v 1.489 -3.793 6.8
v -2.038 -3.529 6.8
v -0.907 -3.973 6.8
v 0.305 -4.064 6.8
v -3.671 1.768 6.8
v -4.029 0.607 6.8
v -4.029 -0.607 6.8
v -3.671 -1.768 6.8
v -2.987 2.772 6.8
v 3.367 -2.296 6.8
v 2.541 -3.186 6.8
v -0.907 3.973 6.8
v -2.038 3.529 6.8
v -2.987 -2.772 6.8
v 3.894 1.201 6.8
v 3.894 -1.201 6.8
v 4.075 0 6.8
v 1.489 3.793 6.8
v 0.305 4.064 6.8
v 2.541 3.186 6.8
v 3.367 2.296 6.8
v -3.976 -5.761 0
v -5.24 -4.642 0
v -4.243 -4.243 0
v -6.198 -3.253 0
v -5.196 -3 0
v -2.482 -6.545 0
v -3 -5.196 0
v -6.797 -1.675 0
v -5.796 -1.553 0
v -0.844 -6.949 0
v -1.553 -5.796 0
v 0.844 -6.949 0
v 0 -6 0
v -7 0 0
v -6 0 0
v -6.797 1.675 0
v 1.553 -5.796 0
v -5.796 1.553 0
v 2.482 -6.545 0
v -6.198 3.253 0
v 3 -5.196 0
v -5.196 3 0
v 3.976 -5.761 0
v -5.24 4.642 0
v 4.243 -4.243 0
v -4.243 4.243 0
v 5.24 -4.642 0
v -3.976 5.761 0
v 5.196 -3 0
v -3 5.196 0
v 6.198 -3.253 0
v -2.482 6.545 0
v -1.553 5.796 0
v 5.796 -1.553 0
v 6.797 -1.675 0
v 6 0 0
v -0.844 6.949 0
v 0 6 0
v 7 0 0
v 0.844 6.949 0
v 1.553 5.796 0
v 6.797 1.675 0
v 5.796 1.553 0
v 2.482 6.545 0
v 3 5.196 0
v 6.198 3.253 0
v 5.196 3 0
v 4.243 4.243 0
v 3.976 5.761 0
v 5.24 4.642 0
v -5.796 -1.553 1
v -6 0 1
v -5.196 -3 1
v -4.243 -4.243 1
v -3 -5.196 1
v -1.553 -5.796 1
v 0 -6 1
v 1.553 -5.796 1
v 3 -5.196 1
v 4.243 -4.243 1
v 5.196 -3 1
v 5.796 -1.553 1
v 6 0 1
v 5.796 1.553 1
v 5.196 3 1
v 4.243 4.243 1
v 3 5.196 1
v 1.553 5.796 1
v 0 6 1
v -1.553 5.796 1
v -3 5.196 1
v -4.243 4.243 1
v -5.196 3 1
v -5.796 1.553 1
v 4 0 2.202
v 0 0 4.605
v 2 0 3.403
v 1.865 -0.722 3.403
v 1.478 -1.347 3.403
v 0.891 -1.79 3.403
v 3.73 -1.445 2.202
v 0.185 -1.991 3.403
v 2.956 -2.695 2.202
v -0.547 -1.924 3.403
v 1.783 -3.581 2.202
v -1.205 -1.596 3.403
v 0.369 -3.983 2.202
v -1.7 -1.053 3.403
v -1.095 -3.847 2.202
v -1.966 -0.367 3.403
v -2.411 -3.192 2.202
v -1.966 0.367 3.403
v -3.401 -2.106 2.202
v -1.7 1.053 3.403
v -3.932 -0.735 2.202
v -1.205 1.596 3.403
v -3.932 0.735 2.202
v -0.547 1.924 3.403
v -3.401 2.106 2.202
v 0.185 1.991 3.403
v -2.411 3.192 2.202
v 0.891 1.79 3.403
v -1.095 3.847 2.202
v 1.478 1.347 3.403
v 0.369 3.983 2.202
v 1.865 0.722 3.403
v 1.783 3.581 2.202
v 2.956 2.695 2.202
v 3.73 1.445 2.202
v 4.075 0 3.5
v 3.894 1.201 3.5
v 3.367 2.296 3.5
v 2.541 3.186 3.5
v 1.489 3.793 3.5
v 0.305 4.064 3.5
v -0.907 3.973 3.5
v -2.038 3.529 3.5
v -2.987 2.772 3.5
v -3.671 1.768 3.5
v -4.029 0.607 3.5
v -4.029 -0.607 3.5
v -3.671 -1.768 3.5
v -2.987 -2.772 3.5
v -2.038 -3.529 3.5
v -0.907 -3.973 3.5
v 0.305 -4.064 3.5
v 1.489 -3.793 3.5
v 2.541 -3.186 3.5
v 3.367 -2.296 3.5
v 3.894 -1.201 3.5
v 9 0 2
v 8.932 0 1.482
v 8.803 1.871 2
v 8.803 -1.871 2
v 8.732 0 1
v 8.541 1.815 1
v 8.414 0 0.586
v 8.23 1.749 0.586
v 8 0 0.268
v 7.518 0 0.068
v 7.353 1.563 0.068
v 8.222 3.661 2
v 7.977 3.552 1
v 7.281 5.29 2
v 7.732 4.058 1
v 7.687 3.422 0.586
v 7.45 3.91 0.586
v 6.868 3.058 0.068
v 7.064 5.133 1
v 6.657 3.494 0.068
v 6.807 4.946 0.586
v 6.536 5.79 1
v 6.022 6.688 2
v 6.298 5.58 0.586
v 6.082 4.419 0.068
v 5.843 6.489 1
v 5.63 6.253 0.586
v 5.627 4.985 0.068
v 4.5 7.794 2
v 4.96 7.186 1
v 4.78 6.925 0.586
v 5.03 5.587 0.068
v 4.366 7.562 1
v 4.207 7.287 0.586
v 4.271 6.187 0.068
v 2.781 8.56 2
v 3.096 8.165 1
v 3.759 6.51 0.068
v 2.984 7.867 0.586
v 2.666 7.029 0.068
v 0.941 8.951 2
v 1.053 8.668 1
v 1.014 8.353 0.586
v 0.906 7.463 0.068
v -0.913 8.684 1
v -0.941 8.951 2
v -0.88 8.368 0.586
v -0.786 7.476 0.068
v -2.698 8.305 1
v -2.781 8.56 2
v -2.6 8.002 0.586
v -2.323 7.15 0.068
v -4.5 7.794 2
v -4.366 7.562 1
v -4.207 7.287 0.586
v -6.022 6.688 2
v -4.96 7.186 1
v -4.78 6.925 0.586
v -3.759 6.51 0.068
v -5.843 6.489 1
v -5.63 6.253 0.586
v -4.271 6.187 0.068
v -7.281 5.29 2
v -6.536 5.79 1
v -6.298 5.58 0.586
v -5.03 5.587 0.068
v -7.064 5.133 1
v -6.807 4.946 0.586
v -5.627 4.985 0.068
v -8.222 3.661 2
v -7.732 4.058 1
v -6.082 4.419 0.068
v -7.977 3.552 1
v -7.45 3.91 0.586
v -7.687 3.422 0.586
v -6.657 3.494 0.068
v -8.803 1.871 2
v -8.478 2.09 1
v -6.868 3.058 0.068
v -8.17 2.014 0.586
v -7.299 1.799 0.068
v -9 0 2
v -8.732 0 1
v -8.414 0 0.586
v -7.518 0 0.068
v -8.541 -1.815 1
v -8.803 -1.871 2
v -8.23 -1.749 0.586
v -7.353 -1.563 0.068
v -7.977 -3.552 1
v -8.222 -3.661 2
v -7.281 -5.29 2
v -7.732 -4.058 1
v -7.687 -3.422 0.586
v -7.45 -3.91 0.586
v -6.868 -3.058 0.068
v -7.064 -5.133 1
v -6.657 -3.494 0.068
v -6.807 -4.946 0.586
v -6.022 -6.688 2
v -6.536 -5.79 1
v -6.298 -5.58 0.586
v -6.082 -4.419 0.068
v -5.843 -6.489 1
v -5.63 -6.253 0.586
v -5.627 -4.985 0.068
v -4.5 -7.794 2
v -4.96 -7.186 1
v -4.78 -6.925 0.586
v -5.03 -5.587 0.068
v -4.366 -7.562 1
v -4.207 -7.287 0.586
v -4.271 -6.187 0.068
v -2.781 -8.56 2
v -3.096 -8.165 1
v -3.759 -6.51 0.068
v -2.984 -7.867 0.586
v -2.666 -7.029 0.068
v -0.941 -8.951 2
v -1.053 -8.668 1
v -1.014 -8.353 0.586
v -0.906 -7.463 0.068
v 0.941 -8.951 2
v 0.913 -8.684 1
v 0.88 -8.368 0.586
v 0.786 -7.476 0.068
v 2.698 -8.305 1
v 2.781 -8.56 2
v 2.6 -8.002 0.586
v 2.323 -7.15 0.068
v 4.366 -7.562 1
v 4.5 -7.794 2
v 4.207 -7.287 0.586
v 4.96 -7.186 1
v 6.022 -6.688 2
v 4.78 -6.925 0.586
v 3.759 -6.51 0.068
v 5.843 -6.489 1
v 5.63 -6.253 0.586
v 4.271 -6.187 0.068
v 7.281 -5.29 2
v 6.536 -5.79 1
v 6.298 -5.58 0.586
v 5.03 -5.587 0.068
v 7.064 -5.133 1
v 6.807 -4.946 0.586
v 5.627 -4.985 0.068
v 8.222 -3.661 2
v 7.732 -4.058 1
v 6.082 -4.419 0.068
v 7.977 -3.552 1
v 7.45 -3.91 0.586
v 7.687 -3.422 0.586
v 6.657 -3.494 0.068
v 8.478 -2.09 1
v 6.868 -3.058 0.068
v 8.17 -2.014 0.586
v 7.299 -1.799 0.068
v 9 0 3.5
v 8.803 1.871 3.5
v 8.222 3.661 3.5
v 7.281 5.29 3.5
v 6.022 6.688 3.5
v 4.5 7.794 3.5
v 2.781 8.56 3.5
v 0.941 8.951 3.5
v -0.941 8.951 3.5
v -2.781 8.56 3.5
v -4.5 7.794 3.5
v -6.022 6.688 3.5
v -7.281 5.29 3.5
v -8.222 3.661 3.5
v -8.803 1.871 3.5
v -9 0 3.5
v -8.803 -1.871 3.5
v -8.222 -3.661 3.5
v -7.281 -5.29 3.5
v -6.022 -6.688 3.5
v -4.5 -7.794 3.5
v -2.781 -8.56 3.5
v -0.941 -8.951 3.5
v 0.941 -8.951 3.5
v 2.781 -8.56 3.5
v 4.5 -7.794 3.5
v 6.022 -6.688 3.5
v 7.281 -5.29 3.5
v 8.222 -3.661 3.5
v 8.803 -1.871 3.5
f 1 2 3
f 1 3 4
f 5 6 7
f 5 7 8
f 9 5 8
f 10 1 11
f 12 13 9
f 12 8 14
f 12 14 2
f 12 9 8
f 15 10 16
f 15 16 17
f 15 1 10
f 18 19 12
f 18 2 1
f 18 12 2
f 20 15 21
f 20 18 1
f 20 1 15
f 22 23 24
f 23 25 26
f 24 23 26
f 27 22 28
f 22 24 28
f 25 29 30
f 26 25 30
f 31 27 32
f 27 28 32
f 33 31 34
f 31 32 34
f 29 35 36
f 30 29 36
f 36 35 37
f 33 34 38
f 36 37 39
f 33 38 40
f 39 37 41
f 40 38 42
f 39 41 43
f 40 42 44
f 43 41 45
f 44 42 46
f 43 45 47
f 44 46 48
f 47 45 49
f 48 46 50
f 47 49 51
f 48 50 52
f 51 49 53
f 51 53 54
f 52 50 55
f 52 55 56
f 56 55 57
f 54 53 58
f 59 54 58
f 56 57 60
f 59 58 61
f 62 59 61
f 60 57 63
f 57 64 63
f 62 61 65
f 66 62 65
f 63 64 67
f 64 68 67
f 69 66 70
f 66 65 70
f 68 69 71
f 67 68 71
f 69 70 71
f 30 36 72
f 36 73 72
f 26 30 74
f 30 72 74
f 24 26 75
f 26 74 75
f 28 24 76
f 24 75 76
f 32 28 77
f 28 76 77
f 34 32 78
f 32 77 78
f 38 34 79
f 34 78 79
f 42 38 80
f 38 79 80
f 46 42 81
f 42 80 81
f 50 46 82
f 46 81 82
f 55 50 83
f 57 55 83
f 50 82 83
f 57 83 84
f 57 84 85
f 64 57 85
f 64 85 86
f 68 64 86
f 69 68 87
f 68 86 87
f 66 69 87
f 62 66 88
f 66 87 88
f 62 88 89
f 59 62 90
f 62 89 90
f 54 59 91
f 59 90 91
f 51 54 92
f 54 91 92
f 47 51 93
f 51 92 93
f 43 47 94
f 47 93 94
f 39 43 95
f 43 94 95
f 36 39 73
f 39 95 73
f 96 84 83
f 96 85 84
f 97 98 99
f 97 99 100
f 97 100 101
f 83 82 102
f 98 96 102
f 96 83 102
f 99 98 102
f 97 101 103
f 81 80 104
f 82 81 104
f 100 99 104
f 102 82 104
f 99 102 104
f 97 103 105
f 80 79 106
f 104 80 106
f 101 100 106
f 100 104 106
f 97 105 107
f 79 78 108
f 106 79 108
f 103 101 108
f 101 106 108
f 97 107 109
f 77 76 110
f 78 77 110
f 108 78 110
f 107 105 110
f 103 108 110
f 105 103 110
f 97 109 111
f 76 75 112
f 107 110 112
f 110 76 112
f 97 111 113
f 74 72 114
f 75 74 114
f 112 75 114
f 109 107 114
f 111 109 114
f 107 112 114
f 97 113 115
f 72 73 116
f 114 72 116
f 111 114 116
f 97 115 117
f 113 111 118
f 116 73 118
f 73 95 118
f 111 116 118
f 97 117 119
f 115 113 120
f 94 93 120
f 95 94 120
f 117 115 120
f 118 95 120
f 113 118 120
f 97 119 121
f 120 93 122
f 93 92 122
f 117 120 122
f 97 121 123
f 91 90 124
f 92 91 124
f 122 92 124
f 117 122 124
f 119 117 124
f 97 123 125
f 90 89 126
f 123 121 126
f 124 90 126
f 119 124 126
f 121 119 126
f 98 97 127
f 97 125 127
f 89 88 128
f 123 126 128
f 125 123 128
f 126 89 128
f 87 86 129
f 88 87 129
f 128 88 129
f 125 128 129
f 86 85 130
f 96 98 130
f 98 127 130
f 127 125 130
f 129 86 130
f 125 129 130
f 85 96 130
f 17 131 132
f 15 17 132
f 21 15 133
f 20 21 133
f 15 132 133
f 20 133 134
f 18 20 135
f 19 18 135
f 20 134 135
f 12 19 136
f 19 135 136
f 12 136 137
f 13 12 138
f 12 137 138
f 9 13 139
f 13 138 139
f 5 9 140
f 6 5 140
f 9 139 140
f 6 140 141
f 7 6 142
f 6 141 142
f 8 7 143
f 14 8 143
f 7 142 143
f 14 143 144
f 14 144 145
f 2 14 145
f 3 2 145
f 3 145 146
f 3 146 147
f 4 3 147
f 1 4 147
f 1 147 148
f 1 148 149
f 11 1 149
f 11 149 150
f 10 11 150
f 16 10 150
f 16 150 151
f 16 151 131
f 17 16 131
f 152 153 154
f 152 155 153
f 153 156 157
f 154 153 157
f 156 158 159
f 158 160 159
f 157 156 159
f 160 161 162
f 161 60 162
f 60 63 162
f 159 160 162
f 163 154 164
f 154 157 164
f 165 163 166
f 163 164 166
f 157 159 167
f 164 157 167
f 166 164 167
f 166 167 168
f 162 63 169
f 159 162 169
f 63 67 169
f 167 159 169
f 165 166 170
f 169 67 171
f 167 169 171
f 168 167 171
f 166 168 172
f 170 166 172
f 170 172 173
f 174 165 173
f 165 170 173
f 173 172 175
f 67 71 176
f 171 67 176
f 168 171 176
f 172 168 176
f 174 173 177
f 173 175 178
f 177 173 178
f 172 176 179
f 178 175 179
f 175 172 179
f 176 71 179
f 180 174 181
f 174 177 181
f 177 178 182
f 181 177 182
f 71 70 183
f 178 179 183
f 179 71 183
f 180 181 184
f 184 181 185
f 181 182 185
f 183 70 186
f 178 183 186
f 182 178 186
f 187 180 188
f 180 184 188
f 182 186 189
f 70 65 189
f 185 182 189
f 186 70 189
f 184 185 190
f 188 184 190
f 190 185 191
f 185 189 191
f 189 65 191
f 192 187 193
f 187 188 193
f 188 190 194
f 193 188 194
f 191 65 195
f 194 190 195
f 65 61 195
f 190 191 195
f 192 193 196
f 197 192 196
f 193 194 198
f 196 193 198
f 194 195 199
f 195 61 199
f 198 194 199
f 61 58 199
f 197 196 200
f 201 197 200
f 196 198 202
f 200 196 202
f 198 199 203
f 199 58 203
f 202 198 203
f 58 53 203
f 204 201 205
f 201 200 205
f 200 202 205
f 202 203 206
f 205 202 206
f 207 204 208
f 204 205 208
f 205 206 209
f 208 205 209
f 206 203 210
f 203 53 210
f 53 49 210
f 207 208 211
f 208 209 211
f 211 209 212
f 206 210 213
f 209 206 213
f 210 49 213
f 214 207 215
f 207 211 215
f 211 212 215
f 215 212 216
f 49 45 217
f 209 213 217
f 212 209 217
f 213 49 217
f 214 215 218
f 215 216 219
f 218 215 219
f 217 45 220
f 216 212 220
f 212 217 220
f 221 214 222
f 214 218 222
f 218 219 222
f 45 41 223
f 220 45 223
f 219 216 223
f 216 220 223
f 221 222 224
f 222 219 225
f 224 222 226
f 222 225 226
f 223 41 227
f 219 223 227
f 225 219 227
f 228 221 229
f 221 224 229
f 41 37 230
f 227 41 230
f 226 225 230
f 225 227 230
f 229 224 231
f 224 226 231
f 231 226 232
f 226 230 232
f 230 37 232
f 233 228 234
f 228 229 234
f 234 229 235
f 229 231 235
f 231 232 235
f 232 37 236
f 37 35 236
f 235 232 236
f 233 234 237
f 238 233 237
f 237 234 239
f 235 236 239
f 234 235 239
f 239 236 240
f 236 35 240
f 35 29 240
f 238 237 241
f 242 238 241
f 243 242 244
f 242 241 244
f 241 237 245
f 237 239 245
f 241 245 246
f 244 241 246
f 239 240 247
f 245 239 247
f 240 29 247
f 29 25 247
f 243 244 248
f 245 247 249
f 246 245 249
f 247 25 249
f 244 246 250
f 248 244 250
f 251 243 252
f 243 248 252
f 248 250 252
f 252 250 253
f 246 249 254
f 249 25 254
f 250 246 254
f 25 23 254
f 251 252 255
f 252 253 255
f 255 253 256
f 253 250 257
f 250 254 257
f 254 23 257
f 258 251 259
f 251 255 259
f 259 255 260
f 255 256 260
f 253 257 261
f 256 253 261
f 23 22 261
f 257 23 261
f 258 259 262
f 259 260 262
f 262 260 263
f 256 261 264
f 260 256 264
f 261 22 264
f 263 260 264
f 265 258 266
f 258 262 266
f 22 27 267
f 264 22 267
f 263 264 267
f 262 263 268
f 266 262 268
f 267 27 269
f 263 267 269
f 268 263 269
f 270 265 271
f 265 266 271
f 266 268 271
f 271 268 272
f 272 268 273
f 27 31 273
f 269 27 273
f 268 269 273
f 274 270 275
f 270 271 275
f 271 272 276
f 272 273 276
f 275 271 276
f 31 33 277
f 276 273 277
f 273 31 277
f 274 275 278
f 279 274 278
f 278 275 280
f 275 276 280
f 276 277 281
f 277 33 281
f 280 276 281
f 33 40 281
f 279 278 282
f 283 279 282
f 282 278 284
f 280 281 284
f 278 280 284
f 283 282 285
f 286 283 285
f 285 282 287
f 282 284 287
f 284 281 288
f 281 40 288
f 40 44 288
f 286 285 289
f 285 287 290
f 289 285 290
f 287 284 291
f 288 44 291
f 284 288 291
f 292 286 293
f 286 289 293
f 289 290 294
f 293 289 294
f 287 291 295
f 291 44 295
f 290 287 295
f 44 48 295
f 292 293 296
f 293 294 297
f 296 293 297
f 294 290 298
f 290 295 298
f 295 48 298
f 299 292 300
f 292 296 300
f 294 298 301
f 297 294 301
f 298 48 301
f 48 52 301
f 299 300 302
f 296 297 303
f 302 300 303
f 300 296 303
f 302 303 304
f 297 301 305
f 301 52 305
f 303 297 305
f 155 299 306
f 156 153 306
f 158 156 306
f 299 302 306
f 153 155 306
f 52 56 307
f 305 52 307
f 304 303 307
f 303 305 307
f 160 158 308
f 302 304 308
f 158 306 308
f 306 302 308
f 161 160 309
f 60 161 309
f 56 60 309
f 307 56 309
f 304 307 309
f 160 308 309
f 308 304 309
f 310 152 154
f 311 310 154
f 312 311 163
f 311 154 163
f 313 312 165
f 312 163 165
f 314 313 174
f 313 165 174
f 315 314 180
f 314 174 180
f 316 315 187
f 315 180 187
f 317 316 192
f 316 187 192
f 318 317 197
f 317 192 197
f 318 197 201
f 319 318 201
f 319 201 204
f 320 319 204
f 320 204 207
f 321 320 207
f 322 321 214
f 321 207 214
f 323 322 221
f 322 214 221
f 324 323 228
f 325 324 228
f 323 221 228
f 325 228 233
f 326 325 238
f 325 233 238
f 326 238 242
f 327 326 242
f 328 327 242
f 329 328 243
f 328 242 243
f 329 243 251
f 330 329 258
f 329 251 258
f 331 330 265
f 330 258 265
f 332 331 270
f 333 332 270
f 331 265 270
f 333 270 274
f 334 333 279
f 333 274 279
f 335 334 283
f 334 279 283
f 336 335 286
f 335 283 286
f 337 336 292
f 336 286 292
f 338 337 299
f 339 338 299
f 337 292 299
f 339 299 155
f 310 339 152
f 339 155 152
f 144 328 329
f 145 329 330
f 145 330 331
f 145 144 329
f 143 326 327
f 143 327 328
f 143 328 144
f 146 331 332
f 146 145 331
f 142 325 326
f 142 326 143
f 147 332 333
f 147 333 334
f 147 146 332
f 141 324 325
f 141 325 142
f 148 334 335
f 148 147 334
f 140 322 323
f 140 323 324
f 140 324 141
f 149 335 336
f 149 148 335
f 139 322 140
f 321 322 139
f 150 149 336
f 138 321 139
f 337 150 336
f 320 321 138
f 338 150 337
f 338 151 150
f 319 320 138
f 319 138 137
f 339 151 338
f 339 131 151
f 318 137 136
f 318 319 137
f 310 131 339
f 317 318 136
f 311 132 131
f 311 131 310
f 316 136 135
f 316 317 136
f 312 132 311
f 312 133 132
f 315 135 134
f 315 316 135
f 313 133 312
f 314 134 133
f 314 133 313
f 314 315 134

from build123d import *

# Parameters (mm, degrees)
F0_R     = 4.075
F1_DEPTH = 6.8
F0_R_2   = 9
F2_DEPTH = 3.5
F3_R     = 2
F4_D     = 12
F4_DEPTH = 1
F4_TIP   = 3.6051637142


with BuildPart() as f1:
    # F0 (on Top) → F1 (new body)
    with BuildSketch(Plane.XY):
        Circle(F0_R)
    extrude(amount=F1_DEPTH)

    # F0 (on Top) → F2 (join)
    with BuildSketch(Plane.XY):
        Circle(F0_R_2)
        Circle(F0_R, mode=Mode.SUBTRACT)
    extrude(amount=F2_DEPTH)

    # F3
    f3_edges = [f1.edges().sort_by_distance(p)[0] for p in [
        (-9, 0, 0),
    ]]
    fillet(f3_edges, radius=F3_R)

    # F4
    with Locations(Plane(origin=(0, 0, 0), x_dir=(1, 0, 0), z_dir=(0, 0, -1))):
        with Locations((0, 0)):
            Hole(F4_D / 2, depth=F4_DEPTH)
            with Locations((0, 0, -(F4_DEPTH + F4_TIP / 2))):  # 118° drill point
                Cone(0, F4_D / 2, F4_TIP, mode=Mode.SUBTRACT)


solid = f1.part
